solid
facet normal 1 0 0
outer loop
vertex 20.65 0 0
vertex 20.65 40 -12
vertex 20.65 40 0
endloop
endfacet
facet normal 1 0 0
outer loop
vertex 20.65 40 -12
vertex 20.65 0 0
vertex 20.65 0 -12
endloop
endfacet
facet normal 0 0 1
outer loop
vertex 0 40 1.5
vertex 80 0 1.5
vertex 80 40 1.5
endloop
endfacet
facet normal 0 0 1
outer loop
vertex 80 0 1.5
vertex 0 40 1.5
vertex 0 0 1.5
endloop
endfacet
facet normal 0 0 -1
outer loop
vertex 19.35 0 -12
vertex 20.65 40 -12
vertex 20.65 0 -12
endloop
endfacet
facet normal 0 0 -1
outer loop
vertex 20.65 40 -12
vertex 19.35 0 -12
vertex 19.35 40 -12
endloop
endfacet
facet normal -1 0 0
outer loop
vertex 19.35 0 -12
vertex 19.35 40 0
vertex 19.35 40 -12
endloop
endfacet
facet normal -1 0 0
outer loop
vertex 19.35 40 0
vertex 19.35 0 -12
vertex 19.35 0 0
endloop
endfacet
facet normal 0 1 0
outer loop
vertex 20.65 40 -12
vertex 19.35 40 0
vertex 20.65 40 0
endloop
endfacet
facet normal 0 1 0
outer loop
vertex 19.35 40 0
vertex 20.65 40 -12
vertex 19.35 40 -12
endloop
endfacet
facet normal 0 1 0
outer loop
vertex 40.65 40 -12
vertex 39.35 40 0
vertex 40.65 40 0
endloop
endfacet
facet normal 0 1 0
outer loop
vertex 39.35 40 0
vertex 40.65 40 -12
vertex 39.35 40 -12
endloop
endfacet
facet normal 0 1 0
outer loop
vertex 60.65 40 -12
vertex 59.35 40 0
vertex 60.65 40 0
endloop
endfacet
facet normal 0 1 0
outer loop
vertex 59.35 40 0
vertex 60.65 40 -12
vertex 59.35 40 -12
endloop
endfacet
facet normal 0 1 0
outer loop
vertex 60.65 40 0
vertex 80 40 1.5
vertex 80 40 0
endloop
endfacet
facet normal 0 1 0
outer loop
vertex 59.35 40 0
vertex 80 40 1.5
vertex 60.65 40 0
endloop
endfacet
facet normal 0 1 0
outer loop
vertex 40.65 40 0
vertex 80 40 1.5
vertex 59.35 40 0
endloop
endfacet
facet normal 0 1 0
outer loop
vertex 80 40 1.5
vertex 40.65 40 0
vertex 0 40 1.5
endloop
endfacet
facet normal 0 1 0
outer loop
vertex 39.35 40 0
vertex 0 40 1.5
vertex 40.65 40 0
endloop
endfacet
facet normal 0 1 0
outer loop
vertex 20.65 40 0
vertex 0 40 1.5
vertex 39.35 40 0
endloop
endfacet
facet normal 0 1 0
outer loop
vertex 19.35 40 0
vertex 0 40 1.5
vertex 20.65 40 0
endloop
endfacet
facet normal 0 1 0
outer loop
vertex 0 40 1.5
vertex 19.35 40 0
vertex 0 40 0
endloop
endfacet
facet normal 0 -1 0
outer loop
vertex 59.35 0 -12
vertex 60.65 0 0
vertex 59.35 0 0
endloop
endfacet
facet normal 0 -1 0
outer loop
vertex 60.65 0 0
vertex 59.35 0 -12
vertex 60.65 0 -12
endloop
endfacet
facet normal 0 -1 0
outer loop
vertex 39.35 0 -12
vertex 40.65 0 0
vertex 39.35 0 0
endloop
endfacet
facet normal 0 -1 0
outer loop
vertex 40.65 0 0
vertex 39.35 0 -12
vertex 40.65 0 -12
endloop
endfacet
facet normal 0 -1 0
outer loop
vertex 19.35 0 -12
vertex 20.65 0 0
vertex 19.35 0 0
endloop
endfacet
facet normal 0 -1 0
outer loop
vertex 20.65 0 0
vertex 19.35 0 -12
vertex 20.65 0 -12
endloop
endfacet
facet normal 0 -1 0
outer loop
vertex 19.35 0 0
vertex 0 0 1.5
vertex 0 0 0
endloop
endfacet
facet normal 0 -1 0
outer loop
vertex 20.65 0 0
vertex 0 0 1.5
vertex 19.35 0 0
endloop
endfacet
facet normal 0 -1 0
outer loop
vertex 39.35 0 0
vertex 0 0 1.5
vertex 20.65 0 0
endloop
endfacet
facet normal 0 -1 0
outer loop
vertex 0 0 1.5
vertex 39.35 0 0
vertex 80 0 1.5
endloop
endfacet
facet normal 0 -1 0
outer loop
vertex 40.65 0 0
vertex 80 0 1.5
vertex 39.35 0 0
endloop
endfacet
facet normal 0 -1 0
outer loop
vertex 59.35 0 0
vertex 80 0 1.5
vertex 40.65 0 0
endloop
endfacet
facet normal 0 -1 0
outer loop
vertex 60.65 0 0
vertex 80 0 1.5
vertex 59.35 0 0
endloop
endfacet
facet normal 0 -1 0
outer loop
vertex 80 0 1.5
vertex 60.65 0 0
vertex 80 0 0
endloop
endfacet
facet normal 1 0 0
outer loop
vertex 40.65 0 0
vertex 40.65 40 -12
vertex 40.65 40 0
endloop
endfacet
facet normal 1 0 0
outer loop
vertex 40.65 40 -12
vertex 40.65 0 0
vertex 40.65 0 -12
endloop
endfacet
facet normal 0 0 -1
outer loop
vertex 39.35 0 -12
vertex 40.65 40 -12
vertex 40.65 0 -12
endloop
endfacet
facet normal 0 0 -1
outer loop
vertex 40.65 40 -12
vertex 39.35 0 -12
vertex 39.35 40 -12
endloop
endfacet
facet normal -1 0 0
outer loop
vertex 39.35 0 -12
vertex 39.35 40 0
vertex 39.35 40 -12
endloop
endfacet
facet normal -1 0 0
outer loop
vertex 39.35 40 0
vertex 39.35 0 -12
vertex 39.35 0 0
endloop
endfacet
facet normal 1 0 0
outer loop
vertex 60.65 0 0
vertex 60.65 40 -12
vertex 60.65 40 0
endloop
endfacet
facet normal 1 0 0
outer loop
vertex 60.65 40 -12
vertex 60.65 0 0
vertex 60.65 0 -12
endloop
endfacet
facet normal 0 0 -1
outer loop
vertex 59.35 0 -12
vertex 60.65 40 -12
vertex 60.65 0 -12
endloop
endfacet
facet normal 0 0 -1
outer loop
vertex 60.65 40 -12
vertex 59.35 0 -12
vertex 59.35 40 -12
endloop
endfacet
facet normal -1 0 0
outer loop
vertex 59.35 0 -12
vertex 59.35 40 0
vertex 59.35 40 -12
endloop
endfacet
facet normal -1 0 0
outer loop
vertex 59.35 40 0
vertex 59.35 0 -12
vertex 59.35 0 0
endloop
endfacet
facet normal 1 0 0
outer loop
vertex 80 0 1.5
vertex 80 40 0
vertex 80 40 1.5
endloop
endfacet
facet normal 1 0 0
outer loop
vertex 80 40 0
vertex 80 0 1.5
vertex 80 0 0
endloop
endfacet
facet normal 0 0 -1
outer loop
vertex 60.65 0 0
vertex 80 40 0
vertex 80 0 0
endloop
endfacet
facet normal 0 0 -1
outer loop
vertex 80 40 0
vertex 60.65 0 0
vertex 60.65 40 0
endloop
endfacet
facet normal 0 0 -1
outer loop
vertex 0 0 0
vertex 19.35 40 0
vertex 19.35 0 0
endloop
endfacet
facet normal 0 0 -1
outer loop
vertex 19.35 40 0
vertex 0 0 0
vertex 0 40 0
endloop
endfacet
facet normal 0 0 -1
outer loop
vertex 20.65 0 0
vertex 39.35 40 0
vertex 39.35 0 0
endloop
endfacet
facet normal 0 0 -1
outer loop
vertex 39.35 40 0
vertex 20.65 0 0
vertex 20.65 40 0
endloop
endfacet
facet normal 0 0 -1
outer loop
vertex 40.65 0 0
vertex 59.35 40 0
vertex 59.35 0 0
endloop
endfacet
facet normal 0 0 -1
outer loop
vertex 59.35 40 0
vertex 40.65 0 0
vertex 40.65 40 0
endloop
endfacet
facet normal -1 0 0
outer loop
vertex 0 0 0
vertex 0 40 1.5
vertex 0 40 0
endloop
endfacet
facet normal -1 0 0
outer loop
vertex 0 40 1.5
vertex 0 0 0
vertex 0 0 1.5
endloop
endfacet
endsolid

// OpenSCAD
$fn = 32;

// ----------------------------------------------------------------------
// Ribbed panel: 1.5 mm panel
// ----------------------------------------------------------------------

// --- parameters (mm) ---
panel_l = 80;             // panel length, X
panel_w = 40;             // panel width, Y
panel_t = 1.5;            // panel thickness, Z
rib_t = 1.3;              // rib thickness
rib_h = 12;               // rib height below the panel
ribs = 3;                 // number of ribs

total_h = panel_t + rib_h;  // overall height

union() {
  cube([panel_l, panel_w, panel_t]);
  for (i = [1 : ribs])
    translate([i * panel_l / (ribs + 1) - rib_t / 2, 0, -rib_h])
      cube([rib_t, panel_w, rib_h + panel_t]);
}
